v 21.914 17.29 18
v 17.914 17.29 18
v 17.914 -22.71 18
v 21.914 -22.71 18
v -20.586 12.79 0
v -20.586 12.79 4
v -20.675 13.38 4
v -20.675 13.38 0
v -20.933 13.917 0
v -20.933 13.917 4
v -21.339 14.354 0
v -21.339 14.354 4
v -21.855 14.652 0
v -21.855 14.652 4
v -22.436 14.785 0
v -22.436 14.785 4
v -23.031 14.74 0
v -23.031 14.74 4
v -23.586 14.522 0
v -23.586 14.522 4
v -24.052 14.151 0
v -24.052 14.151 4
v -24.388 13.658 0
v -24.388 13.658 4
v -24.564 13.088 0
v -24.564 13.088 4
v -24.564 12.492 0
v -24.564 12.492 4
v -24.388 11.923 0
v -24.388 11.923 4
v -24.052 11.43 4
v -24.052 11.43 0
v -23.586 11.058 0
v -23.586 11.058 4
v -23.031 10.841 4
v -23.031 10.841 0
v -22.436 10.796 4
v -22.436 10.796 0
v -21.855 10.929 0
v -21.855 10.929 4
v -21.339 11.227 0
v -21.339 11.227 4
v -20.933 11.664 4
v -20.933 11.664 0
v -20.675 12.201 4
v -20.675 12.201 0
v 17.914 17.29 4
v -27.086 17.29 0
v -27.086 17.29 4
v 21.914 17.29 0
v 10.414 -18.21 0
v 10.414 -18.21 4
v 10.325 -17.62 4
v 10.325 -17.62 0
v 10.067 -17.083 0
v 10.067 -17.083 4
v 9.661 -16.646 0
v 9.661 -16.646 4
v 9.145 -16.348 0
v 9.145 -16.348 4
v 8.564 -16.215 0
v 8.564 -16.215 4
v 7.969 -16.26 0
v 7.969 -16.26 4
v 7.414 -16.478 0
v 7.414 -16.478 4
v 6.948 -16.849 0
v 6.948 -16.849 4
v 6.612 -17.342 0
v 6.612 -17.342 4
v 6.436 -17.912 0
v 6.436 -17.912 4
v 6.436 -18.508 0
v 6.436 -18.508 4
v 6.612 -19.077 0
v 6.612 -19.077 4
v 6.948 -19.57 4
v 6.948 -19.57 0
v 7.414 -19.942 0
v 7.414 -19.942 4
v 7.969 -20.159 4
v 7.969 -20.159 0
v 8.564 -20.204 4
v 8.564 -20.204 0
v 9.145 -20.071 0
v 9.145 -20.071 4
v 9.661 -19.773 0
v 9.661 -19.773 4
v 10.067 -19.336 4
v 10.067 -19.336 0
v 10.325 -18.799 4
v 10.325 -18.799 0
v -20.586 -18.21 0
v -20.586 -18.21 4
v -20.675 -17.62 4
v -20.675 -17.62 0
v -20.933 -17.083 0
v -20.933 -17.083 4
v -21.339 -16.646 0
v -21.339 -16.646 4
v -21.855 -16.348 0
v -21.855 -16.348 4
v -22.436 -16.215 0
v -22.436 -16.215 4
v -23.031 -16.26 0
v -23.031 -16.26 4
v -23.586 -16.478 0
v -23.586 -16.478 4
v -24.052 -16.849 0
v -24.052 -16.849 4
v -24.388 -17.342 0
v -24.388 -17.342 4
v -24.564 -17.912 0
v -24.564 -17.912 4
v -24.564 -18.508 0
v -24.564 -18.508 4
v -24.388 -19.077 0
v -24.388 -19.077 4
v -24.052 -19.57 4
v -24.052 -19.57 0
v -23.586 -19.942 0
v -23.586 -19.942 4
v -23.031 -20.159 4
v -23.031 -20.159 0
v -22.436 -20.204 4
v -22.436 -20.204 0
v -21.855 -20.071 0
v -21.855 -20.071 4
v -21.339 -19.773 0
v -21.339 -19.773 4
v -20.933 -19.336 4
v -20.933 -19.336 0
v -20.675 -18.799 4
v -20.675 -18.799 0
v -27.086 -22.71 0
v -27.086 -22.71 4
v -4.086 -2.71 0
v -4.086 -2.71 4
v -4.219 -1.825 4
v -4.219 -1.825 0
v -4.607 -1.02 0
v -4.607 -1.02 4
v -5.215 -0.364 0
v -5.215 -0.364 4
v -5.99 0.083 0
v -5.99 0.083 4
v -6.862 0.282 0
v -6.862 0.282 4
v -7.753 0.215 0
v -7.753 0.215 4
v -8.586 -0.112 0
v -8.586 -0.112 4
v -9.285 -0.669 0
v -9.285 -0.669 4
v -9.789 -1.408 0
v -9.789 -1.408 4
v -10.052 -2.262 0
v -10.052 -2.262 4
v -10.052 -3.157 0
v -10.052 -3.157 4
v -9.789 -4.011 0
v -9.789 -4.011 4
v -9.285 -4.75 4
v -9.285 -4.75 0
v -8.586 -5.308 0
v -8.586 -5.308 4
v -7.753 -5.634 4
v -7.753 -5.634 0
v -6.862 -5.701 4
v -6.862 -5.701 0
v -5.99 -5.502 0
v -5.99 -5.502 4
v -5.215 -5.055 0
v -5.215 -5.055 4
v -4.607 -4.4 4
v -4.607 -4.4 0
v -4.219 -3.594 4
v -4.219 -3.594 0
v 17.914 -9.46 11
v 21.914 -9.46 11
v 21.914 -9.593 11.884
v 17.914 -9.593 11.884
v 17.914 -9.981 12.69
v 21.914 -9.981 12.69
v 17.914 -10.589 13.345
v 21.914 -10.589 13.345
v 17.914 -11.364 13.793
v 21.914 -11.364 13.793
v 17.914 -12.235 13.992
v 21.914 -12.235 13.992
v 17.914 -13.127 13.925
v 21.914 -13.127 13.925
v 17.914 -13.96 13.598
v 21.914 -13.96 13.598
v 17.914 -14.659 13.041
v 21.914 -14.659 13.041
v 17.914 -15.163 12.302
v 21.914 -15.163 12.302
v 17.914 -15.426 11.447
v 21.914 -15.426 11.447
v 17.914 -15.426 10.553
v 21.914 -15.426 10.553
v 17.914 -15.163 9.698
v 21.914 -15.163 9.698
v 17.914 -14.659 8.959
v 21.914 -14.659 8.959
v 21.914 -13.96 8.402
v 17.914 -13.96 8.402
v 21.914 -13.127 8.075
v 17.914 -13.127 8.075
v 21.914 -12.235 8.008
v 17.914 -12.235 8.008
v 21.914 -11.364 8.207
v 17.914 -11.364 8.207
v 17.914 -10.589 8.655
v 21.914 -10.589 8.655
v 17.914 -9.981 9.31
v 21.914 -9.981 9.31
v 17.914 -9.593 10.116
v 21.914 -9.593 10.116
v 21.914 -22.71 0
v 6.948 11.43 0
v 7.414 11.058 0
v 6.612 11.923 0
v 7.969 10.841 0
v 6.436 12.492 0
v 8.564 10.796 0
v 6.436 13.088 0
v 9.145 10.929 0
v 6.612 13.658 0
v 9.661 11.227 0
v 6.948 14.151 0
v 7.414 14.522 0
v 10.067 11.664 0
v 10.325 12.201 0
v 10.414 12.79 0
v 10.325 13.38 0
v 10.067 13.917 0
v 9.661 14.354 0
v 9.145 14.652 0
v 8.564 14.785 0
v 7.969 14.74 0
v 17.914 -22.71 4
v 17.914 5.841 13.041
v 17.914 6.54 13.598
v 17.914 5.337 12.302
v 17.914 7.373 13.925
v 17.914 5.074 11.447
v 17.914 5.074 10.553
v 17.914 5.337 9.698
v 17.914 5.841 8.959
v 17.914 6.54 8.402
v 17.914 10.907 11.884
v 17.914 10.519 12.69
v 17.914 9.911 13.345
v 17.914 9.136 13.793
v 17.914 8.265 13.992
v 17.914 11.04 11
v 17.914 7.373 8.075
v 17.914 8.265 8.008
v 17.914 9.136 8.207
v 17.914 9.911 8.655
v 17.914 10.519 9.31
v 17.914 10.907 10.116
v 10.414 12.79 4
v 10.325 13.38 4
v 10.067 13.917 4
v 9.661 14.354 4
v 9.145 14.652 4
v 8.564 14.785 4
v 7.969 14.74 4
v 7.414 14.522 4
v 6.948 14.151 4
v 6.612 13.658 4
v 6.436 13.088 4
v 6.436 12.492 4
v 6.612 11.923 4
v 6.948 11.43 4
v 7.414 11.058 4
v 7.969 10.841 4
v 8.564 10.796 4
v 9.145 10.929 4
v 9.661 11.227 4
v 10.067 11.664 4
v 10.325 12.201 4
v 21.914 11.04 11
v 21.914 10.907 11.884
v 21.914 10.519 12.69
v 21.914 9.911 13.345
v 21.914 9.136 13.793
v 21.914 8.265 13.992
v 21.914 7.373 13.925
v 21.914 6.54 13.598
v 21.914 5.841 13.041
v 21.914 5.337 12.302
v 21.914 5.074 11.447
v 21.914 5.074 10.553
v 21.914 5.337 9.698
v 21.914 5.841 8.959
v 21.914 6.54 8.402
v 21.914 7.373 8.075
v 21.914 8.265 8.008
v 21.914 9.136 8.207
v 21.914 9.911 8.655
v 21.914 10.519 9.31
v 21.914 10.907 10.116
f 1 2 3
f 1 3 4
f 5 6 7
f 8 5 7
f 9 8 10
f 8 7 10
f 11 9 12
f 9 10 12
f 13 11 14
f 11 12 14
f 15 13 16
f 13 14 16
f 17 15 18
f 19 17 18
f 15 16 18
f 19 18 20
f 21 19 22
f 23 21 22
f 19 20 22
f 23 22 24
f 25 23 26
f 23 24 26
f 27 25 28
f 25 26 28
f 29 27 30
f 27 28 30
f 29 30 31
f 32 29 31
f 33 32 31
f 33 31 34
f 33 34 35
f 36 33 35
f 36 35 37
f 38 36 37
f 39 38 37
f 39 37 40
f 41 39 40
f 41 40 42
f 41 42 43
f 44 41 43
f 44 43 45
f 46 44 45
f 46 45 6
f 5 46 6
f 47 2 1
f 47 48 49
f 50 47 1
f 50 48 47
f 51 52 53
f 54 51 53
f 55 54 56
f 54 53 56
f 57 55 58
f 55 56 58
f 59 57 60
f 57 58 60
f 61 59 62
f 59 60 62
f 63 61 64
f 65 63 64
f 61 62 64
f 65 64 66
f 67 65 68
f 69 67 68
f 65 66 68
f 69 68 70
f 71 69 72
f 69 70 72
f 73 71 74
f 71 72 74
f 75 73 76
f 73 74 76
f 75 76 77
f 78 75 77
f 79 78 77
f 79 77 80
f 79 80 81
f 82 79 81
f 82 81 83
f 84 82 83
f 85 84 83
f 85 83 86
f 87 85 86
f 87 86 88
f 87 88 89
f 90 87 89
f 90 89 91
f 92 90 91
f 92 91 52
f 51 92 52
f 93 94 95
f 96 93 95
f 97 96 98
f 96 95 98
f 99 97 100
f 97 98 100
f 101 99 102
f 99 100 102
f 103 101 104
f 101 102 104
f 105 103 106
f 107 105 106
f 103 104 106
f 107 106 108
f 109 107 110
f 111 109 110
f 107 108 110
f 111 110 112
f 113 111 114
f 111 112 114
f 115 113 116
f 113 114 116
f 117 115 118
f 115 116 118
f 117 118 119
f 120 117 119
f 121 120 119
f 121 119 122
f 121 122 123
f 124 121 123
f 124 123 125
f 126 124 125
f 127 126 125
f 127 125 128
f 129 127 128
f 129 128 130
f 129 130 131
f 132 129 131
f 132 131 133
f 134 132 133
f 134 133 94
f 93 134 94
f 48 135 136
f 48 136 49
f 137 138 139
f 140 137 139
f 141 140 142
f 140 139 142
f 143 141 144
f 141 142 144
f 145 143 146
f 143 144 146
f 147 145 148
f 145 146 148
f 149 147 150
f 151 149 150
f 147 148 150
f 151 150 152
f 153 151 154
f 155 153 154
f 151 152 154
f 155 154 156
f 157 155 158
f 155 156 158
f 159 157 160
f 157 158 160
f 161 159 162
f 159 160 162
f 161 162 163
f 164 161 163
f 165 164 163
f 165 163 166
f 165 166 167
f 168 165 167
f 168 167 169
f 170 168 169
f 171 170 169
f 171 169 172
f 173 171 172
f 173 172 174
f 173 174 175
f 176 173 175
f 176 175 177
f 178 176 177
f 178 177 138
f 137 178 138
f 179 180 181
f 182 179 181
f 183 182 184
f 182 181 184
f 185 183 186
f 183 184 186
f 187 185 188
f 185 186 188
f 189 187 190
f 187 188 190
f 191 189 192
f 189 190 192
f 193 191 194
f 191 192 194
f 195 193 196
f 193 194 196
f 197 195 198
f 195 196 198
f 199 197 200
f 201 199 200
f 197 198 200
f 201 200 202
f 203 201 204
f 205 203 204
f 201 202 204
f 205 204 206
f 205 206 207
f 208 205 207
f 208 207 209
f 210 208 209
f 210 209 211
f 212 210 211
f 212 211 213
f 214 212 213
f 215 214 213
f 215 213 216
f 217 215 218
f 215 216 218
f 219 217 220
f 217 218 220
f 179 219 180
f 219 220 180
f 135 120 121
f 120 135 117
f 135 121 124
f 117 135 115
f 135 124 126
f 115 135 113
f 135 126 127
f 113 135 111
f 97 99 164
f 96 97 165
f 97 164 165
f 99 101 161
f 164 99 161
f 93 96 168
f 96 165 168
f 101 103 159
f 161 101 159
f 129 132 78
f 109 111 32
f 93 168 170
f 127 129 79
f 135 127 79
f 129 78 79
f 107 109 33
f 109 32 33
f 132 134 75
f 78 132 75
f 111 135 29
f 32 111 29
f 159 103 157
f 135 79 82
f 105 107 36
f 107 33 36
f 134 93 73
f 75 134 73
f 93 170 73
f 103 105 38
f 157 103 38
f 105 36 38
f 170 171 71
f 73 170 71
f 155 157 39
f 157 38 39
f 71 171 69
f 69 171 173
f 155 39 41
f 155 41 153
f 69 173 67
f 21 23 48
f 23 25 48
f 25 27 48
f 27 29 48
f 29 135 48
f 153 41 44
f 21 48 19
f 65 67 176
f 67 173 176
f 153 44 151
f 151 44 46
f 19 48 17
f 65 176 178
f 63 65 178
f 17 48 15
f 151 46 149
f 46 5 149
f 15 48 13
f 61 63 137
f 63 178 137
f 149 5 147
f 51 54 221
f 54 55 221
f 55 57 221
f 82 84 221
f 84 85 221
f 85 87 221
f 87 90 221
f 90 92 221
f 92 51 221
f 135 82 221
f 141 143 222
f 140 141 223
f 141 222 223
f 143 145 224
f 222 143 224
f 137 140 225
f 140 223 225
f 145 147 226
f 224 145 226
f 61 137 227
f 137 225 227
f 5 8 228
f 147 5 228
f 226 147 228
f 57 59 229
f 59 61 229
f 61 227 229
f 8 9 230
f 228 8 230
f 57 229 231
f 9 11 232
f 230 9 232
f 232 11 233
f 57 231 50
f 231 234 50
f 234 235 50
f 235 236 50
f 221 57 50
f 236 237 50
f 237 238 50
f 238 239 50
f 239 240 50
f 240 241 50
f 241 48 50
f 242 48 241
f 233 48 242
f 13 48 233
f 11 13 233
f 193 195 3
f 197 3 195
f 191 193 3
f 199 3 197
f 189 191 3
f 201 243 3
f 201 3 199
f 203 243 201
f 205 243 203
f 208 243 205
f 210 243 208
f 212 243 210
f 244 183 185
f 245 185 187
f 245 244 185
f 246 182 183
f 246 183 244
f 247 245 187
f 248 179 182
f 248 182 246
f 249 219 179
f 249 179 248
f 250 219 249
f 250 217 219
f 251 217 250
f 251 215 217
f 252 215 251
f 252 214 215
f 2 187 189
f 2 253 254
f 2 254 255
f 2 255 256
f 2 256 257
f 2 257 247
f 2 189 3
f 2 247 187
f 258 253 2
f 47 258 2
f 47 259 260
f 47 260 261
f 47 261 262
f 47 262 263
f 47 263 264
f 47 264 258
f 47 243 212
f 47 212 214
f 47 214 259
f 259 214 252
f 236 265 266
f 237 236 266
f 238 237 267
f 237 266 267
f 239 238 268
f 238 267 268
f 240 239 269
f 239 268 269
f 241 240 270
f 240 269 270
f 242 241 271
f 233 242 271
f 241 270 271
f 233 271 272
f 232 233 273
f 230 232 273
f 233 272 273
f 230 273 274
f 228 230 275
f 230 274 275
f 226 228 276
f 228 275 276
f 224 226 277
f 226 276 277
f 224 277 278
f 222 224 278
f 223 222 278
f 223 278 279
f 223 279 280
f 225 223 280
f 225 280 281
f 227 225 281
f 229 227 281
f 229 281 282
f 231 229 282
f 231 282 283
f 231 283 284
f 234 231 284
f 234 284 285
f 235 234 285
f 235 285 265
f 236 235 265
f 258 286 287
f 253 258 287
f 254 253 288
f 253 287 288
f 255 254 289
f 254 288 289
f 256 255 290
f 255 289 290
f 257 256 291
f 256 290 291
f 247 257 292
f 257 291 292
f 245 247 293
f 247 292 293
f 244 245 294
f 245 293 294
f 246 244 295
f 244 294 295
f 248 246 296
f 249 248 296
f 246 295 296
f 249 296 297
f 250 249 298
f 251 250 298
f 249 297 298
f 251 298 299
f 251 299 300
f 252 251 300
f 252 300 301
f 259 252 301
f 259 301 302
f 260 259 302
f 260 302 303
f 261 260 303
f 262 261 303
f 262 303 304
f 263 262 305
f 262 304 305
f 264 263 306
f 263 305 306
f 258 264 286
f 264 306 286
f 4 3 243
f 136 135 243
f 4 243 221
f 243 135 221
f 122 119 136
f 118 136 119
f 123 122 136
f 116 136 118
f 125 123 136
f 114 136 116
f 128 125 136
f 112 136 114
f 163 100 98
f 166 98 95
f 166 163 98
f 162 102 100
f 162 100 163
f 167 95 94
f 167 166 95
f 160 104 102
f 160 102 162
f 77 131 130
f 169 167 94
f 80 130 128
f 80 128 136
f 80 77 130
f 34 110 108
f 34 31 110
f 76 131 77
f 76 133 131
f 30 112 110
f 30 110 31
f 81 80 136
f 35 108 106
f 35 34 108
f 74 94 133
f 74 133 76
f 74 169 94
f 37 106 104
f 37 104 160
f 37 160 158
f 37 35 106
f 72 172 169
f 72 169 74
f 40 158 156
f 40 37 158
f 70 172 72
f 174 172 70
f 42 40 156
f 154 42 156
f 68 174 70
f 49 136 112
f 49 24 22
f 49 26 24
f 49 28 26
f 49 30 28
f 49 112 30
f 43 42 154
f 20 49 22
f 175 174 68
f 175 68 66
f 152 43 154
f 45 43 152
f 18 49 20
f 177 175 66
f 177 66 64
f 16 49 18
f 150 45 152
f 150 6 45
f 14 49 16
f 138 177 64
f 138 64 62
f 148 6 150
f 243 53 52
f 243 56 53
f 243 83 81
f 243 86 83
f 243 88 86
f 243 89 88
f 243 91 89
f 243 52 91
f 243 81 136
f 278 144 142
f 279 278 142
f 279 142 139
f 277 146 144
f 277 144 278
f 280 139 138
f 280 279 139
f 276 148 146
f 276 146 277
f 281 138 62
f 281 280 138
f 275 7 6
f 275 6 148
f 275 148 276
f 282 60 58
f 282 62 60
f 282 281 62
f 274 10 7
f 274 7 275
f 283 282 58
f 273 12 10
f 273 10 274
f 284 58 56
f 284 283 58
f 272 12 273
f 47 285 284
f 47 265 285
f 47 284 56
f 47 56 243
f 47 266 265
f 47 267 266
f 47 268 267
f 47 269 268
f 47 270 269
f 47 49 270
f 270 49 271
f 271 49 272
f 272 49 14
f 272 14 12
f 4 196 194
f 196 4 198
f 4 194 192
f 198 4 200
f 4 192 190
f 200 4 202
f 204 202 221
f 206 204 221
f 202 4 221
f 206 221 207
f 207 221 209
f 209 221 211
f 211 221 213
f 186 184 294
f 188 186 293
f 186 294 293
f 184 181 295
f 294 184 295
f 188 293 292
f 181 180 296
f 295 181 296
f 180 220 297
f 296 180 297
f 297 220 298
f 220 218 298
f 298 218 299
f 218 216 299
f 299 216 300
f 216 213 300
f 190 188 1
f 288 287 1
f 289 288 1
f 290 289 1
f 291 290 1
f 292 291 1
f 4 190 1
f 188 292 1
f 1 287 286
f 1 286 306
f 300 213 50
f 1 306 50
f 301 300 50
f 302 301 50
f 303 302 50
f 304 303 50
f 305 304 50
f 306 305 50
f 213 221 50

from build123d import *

# Parameters (mm, degrees)
ESQUISSE1_W             = 49
ESQUISSE1_H             = 40
BOSS_EXTRU_1_DEPTH      = 4
ESQUISSE2_W             = 4
ESQUISSE2_H             = 40
BOSS_EXTRU_2_DEPTH      = 14
ESQUISSE3_R             = 3
ENL_V_MAT_EXTRU_1_DEPTH = 4
ESQUISSE4_R             = 3
ESQUISSE4_R_2           = 2
ENL_V_MAT_EXTRU_2_DEPTH = 5


with BuildPart() as part:
    # Esquisse1 → Boss.-Extru.1 (new body)
    with BuildSketch(Plane.XY):
        with Locations((-2.585864486, -2.70959596)):
            Rectangle(ESQUISSE1_W, ESQUISSE1_H)
    extrude(amount=BOSS_EXTRU_1_DEPTH)

    # Esquisse2 → Boss.-Extru.2 (add)
    with BuildSketch(Plane.XY.offset(4)):
        with Locations((19.914135514, -2.70959596)):
            Rectangle(ESQUISSE2_W, ESQUISSE2_H)
    extrude(amount=BOSS_EXTRU_2_DEPTH)

    # Esquisse3 → Enlèv. mat.-Extru.1 (cut)
    with BuildSketch(Plane(origin=(21.914135514, 0, 0), x_dir=(0, 0, -1), z_dir=(1, 0, 0))):
        with Locations(Location((-11, 8.04040404, 0), (0, 0, 90))):  # turned: the seam where the file's is
            Circle(ESQUISSE3_R)
        with Locations(Location((-11, -12.45959596, 0), (0, 0, 90))):  # turned: the seam where the file's is
            Circle(ESQUISSE3_R)
    extrude(amount=-ENL_V_MAT_EXTRU_1_DEPTH, mode=Mode.SUBTRACT)

    # Esquisse4 → Enlèv. mat.-Extru.2 (cut, through all)
    with BuildSketch(Plane.XY.offset(4)):
        with Locations((-7.085864486, -2.70959596)):
            Circle(ESQUISSE4_R)
        with Locations((-22.585864486, 12.79040404)):
            Circle(ESQUISSE4_R_2)
        with Locations((8.414135514, 12.79040404)):
            Circle(ESQUISSE4_R_2)
        with Locations((8.414135514, -18.20959596)):
            Circle(ESQUISSE4_R_2)
        with Locations((-22.585864486, -18.20959596)):
            Circle(ESQUISSE4_R_2)
    extrude(amount=-ENL_V_MAT_EXTRU_2_DEPTH, mode=Mode.SUBTRACT)


solid = part.part
